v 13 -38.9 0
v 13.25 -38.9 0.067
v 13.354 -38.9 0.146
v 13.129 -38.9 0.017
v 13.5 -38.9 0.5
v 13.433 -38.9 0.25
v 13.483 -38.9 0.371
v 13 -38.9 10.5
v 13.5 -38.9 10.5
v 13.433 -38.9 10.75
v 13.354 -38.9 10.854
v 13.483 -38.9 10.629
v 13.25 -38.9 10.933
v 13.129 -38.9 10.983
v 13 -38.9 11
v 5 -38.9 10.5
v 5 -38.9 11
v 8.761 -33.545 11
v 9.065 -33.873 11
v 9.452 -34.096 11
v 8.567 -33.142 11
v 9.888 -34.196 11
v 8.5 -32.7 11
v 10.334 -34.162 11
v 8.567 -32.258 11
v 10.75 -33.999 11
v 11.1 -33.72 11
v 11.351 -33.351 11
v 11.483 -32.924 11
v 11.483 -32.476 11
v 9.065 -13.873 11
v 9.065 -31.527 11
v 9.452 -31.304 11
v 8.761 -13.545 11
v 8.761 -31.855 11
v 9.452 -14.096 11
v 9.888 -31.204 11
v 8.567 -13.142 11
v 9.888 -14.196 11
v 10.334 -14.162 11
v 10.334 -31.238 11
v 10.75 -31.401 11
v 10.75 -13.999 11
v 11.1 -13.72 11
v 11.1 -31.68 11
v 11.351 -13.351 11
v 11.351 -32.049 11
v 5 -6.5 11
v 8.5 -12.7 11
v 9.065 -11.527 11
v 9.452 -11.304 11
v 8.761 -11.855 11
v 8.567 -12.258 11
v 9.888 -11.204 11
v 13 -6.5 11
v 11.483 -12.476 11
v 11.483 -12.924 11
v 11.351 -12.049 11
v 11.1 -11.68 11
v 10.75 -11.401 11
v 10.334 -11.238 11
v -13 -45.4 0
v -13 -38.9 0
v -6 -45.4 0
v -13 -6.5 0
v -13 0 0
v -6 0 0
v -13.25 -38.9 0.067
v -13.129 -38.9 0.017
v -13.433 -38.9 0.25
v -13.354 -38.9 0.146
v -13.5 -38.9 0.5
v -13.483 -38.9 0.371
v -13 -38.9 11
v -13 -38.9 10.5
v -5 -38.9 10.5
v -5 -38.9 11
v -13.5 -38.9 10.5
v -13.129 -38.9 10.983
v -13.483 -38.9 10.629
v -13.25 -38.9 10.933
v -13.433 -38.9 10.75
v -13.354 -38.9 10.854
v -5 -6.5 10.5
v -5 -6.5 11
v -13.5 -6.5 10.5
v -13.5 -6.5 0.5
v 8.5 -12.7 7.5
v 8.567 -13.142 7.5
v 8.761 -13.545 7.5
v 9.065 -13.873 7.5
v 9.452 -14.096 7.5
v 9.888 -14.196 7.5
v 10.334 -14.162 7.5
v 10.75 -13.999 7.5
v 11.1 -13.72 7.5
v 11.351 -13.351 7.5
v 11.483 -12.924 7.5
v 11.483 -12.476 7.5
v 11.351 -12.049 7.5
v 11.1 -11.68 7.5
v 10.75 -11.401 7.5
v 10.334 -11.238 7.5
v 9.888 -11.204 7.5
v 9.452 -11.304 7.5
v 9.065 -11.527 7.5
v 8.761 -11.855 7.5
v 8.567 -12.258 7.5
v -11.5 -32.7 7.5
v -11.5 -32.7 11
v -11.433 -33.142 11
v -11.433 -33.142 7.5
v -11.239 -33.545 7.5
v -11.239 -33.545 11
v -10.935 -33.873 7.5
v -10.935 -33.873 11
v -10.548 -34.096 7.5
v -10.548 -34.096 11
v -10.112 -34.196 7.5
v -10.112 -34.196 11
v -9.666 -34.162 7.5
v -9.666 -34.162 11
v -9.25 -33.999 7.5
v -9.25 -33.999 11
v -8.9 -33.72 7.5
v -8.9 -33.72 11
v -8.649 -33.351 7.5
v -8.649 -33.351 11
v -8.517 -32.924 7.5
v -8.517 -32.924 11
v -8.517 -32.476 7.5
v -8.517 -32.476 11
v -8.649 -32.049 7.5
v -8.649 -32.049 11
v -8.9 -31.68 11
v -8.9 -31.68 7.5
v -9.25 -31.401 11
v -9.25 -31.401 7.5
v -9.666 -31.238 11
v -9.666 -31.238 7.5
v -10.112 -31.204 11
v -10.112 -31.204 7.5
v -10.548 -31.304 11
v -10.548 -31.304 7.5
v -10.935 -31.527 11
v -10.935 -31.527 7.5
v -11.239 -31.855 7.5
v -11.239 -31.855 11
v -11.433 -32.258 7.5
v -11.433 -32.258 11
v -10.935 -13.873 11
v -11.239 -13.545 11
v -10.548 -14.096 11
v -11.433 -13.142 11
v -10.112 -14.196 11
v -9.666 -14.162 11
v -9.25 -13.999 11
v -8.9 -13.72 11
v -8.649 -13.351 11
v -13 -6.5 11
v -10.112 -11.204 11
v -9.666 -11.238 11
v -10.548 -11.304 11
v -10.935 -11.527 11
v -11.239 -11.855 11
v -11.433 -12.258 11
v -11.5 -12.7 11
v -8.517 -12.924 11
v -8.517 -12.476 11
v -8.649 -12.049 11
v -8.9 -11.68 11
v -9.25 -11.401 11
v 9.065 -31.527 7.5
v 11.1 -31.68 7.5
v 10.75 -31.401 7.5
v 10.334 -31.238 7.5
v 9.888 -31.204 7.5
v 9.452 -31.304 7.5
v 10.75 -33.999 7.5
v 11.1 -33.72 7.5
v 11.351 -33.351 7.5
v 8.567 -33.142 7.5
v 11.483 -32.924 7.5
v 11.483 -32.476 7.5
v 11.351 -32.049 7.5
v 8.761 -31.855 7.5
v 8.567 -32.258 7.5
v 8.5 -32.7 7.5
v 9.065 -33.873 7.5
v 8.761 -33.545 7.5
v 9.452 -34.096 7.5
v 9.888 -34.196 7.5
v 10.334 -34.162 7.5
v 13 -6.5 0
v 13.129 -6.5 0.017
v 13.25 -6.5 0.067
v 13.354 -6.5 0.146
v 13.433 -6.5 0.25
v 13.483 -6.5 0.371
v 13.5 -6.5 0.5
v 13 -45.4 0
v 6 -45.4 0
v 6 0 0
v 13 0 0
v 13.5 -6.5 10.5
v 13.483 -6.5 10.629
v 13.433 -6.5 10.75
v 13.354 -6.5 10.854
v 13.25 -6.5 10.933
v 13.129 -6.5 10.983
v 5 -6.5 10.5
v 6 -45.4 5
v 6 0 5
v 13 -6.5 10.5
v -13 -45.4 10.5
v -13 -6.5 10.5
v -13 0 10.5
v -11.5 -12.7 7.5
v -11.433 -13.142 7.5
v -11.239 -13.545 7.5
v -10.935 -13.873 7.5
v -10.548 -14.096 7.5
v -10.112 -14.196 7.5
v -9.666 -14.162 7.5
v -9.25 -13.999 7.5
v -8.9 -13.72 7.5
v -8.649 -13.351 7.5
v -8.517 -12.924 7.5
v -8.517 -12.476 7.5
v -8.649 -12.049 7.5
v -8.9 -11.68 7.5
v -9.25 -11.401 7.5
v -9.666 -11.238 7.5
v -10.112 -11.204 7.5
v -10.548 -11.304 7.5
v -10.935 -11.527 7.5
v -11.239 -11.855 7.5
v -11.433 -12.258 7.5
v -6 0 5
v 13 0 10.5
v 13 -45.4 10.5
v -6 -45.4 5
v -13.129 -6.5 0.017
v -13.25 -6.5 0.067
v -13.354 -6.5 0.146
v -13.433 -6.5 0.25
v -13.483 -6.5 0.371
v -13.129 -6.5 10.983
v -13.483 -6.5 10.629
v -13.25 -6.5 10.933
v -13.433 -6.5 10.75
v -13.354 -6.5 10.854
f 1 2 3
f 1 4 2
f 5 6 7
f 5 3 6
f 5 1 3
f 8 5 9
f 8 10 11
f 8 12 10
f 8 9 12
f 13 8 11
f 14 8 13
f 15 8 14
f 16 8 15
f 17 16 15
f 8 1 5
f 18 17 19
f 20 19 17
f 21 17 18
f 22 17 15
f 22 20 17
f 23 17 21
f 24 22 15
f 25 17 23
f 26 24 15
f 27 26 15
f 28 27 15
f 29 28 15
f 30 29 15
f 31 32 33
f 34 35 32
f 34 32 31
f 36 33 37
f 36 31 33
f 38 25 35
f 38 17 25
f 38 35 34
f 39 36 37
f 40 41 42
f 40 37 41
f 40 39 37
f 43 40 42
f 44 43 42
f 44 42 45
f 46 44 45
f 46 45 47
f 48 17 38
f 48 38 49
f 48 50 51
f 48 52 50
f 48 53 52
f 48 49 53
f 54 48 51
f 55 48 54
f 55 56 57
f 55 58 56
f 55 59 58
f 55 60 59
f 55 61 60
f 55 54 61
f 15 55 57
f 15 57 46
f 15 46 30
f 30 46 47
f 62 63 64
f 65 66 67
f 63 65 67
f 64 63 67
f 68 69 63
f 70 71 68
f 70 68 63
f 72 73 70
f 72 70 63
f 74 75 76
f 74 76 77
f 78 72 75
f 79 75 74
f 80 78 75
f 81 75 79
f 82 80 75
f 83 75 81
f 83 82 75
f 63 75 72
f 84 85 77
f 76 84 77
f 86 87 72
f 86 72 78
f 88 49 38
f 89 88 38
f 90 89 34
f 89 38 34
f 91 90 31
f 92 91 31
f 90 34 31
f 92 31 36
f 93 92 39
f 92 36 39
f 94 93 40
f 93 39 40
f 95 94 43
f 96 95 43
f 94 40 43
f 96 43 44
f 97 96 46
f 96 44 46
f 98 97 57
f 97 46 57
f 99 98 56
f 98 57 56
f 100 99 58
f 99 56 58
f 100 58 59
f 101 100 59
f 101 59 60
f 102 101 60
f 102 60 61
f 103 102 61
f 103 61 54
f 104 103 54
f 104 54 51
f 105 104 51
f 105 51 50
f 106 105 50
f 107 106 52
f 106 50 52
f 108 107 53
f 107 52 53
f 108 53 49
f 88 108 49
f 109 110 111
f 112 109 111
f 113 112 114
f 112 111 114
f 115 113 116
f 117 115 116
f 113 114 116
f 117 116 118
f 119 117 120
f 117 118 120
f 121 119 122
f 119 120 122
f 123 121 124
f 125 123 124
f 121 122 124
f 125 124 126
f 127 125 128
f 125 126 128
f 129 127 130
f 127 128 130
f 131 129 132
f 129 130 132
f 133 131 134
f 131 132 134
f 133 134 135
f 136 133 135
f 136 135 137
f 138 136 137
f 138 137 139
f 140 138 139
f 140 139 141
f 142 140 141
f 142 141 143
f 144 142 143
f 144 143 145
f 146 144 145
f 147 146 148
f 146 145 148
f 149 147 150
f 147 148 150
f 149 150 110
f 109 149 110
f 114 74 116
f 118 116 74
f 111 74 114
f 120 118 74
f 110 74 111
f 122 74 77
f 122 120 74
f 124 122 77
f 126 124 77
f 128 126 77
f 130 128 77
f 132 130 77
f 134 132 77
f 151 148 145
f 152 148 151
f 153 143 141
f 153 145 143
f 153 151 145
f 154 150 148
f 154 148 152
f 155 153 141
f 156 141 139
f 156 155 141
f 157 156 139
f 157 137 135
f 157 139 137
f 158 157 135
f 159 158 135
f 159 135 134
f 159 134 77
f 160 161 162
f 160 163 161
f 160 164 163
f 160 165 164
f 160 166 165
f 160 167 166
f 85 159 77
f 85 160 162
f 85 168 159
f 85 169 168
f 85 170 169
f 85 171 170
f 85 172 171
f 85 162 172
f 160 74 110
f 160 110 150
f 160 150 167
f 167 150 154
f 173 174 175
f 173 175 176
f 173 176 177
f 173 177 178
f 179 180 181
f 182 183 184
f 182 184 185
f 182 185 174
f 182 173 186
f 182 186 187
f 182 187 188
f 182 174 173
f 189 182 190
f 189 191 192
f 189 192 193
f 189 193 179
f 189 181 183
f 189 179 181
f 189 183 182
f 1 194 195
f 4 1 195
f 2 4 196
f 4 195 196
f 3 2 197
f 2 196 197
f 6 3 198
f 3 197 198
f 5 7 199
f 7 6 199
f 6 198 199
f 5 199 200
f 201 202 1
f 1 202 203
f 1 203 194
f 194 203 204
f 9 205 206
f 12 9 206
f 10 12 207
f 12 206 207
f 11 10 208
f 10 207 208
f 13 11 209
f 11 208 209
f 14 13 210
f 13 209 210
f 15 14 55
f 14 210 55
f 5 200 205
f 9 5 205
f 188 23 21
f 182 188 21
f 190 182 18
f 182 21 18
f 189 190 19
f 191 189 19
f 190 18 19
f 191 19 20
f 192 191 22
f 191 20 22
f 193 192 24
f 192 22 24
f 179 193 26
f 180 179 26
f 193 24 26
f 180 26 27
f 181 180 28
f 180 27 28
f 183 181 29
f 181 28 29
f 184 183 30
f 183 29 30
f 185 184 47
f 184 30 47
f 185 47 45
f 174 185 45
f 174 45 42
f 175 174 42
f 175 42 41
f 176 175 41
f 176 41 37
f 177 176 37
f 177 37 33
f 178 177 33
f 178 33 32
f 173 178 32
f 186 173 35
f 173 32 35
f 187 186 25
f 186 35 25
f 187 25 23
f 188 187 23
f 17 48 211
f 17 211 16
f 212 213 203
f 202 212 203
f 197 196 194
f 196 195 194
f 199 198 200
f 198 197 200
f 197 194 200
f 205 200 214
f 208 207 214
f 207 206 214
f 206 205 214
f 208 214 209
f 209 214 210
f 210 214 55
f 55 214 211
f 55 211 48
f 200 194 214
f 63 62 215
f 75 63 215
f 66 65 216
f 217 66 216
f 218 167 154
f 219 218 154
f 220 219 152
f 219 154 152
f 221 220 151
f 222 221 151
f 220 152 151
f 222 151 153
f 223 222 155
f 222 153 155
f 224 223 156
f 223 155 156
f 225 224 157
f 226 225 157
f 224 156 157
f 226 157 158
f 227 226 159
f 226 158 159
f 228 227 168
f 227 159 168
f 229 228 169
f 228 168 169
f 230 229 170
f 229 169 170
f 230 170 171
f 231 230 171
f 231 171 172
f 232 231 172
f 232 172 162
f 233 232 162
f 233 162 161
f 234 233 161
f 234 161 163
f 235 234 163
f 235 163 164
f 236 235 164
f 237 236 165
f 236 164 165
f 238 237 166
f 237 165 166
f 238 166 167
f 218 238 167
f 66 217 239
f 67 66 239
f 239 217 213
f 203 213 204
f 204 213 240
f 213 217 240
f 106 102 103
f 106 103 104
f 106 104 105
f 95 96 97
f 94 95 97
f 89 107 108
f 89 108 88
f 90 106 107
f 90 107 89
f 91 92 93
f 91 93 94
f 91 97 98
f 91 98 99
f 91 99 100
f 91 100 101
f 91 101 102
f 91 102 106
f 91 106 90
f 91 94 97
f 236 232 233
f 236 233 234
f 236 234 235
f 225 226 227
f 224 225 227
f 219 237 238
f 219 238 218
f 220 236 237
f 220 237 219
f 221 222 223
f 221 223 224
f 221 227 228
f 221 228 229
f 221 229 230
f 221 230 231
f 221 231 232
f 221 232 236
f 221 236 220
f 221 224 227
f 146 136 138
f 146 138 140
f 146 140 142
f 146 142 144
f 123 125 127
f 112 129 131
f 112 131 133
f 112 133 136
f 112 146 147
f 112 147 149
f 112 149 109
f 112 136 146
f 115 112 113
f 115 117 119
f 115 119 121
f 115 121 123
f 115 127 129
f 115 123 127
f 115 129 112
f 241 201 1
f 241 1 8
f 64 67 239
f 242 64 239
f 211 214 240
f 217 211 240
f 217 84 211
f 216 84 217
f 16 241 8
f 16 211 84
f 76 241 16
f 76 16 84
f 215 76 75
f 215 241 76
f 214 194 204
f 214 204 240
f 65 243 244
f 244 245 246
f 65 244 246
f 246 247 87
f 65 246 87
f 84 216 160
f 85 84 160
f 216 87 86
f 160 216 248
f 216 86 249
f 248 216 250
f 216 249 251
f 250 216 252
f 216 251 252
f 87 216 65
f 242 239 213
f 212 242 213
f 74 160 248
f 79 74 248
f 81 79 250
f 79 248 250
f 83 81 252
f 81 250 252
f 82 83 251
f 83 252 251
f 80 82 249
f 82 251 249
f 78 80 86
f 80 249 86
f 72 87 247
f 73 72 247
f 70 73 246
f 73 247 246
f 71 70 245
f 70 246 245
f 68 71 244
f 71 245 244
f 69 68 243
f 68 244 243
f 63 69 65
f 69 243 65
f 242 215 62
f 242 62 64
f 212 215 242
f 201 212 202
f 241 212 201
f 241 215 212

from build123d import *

# Parameters (mm, degrees)
PAD_DEPTH       = 45.4
SKETCH001_R     = 1.5
POCKET_DEPTH    = 3.5
SKETCH002_W     = 27
SKETCH002_H     = 6.5
POCKET001_DEPTH = 0.5
SKETCH003_W     = 10.5
SKETCH003_H     = 6.5
POCKET002_DEPTH = 0.5
SKETCH004_W     = 10
SKETCH004_H     = 32.4
POCKET003_DEPTH = 0.5


with BuildPart() as part:
    # Sketch → Pad (new body)
    with BuildSketch(Plane.XZ):
        with BuildLine():
            Line((-13, 0), (-6, 0))
            Line((-6, 0), (-6, 5))
            Line((-6, 5), (6, 5))
            Line((6, 5), (6, 0))
            Line((6, 0), (13, 0))
            ThreePointArc((13, 0), (13.353553, 0.146447), (13.5, 0.5))
            Line((13.5, 0.5), (13.5, 10.5))
            ThreePointArc((13.5, 10.5), (13.353553, 10.853553), (13, 11))
            Line((-13, 11), (13, 11))
            ThreePointArc((-13, 11), (-13.353553, 10.853553), (-13.5, 10.5))
            Line((-13.5, 0.5), (-13.5, 10.5))
            ThreePointArc((-13.5, 0.5), (-13.353553, 0.146447), (-13, 0))
        make_face()
    extrude(amount=PAD_DEPTH)

    # Sketch001 (on Face10 of Pad) → Pocket (cut)
    with BuildSketch(Plane(origin=(0, 0, 11), x_dir=(-1, 0, 0), z_dir=(0, 0, 1))):
        with Locations((-10, 12.7)):
            Circle(SKETCH001_R)
        with Locations((10, 12.7)):
            Circle(SKETCH001_R)
        with Locations((-10, 32.7)):
            Circle(SKETCH001_R)
        with Locations((10, 32.7)):
            Circle(SKETCH001_R)
    extrude(amount=-POCKET_DEPTH, mode=Mode.SUBTRACT)

    # Sketch002 (on Face14 of Pocket) → Pocket001 (cut)
    with BuildSketch(Plane(origin=(0, 0, 11), x_dir=(-1, 0, 0), z_dir=(0, 0, 1))):
        with Locations((0, 3.25)):
            Rectangle(SKETCH002_W, SKETCH002_H)
        with Locations((0, 42.15)):
            Rectangle(SKETCH002_W, SKETCH002_H)
    extrude(amount=-POCKET001_DEPTH, mode=Mode.SUBTRACT)

    # Sketch003 (on Face10 of Pocket001) → Pocket002 (cut)
    with BuildSketch(Plane(origin=(13.5, 0, 0), x_dir=(0, 0, 1), z_dir=(1, 0, 0))):
        with Locations((5.25, 42.15)):
            Rectangle(SKETCH003_W, SKETCH003_H)
        with Locations((5.25, 3.25)):
            Rectangle(SKETCH003_W, SKETCH003_H)
    pocket002 = extrude(amount=-POCKET002_DEPTH, mode=Mode.SUBTRACT)

    # Mirrored: Pocket002 across YZ
    add(pocket002.mirror(Plane.YZ), mode=Mode.SUBTRACT)

    # Sketch004 (on Face24 of Mirrored) → Pocket003 (cut)
    with BuildSketch(Plane(origin=(0, 0, 11), x_dir=(-1, 0, 0), z_dir=(0, 0, 1))):
        with Locations((0, 22.7)):
            Rectangle(SKETCH004_W, SKETCH004_H)
    extrude(amount=-POCKET003_DEPTH, mode=Mode.SUBTRACT)


solid = part.part
